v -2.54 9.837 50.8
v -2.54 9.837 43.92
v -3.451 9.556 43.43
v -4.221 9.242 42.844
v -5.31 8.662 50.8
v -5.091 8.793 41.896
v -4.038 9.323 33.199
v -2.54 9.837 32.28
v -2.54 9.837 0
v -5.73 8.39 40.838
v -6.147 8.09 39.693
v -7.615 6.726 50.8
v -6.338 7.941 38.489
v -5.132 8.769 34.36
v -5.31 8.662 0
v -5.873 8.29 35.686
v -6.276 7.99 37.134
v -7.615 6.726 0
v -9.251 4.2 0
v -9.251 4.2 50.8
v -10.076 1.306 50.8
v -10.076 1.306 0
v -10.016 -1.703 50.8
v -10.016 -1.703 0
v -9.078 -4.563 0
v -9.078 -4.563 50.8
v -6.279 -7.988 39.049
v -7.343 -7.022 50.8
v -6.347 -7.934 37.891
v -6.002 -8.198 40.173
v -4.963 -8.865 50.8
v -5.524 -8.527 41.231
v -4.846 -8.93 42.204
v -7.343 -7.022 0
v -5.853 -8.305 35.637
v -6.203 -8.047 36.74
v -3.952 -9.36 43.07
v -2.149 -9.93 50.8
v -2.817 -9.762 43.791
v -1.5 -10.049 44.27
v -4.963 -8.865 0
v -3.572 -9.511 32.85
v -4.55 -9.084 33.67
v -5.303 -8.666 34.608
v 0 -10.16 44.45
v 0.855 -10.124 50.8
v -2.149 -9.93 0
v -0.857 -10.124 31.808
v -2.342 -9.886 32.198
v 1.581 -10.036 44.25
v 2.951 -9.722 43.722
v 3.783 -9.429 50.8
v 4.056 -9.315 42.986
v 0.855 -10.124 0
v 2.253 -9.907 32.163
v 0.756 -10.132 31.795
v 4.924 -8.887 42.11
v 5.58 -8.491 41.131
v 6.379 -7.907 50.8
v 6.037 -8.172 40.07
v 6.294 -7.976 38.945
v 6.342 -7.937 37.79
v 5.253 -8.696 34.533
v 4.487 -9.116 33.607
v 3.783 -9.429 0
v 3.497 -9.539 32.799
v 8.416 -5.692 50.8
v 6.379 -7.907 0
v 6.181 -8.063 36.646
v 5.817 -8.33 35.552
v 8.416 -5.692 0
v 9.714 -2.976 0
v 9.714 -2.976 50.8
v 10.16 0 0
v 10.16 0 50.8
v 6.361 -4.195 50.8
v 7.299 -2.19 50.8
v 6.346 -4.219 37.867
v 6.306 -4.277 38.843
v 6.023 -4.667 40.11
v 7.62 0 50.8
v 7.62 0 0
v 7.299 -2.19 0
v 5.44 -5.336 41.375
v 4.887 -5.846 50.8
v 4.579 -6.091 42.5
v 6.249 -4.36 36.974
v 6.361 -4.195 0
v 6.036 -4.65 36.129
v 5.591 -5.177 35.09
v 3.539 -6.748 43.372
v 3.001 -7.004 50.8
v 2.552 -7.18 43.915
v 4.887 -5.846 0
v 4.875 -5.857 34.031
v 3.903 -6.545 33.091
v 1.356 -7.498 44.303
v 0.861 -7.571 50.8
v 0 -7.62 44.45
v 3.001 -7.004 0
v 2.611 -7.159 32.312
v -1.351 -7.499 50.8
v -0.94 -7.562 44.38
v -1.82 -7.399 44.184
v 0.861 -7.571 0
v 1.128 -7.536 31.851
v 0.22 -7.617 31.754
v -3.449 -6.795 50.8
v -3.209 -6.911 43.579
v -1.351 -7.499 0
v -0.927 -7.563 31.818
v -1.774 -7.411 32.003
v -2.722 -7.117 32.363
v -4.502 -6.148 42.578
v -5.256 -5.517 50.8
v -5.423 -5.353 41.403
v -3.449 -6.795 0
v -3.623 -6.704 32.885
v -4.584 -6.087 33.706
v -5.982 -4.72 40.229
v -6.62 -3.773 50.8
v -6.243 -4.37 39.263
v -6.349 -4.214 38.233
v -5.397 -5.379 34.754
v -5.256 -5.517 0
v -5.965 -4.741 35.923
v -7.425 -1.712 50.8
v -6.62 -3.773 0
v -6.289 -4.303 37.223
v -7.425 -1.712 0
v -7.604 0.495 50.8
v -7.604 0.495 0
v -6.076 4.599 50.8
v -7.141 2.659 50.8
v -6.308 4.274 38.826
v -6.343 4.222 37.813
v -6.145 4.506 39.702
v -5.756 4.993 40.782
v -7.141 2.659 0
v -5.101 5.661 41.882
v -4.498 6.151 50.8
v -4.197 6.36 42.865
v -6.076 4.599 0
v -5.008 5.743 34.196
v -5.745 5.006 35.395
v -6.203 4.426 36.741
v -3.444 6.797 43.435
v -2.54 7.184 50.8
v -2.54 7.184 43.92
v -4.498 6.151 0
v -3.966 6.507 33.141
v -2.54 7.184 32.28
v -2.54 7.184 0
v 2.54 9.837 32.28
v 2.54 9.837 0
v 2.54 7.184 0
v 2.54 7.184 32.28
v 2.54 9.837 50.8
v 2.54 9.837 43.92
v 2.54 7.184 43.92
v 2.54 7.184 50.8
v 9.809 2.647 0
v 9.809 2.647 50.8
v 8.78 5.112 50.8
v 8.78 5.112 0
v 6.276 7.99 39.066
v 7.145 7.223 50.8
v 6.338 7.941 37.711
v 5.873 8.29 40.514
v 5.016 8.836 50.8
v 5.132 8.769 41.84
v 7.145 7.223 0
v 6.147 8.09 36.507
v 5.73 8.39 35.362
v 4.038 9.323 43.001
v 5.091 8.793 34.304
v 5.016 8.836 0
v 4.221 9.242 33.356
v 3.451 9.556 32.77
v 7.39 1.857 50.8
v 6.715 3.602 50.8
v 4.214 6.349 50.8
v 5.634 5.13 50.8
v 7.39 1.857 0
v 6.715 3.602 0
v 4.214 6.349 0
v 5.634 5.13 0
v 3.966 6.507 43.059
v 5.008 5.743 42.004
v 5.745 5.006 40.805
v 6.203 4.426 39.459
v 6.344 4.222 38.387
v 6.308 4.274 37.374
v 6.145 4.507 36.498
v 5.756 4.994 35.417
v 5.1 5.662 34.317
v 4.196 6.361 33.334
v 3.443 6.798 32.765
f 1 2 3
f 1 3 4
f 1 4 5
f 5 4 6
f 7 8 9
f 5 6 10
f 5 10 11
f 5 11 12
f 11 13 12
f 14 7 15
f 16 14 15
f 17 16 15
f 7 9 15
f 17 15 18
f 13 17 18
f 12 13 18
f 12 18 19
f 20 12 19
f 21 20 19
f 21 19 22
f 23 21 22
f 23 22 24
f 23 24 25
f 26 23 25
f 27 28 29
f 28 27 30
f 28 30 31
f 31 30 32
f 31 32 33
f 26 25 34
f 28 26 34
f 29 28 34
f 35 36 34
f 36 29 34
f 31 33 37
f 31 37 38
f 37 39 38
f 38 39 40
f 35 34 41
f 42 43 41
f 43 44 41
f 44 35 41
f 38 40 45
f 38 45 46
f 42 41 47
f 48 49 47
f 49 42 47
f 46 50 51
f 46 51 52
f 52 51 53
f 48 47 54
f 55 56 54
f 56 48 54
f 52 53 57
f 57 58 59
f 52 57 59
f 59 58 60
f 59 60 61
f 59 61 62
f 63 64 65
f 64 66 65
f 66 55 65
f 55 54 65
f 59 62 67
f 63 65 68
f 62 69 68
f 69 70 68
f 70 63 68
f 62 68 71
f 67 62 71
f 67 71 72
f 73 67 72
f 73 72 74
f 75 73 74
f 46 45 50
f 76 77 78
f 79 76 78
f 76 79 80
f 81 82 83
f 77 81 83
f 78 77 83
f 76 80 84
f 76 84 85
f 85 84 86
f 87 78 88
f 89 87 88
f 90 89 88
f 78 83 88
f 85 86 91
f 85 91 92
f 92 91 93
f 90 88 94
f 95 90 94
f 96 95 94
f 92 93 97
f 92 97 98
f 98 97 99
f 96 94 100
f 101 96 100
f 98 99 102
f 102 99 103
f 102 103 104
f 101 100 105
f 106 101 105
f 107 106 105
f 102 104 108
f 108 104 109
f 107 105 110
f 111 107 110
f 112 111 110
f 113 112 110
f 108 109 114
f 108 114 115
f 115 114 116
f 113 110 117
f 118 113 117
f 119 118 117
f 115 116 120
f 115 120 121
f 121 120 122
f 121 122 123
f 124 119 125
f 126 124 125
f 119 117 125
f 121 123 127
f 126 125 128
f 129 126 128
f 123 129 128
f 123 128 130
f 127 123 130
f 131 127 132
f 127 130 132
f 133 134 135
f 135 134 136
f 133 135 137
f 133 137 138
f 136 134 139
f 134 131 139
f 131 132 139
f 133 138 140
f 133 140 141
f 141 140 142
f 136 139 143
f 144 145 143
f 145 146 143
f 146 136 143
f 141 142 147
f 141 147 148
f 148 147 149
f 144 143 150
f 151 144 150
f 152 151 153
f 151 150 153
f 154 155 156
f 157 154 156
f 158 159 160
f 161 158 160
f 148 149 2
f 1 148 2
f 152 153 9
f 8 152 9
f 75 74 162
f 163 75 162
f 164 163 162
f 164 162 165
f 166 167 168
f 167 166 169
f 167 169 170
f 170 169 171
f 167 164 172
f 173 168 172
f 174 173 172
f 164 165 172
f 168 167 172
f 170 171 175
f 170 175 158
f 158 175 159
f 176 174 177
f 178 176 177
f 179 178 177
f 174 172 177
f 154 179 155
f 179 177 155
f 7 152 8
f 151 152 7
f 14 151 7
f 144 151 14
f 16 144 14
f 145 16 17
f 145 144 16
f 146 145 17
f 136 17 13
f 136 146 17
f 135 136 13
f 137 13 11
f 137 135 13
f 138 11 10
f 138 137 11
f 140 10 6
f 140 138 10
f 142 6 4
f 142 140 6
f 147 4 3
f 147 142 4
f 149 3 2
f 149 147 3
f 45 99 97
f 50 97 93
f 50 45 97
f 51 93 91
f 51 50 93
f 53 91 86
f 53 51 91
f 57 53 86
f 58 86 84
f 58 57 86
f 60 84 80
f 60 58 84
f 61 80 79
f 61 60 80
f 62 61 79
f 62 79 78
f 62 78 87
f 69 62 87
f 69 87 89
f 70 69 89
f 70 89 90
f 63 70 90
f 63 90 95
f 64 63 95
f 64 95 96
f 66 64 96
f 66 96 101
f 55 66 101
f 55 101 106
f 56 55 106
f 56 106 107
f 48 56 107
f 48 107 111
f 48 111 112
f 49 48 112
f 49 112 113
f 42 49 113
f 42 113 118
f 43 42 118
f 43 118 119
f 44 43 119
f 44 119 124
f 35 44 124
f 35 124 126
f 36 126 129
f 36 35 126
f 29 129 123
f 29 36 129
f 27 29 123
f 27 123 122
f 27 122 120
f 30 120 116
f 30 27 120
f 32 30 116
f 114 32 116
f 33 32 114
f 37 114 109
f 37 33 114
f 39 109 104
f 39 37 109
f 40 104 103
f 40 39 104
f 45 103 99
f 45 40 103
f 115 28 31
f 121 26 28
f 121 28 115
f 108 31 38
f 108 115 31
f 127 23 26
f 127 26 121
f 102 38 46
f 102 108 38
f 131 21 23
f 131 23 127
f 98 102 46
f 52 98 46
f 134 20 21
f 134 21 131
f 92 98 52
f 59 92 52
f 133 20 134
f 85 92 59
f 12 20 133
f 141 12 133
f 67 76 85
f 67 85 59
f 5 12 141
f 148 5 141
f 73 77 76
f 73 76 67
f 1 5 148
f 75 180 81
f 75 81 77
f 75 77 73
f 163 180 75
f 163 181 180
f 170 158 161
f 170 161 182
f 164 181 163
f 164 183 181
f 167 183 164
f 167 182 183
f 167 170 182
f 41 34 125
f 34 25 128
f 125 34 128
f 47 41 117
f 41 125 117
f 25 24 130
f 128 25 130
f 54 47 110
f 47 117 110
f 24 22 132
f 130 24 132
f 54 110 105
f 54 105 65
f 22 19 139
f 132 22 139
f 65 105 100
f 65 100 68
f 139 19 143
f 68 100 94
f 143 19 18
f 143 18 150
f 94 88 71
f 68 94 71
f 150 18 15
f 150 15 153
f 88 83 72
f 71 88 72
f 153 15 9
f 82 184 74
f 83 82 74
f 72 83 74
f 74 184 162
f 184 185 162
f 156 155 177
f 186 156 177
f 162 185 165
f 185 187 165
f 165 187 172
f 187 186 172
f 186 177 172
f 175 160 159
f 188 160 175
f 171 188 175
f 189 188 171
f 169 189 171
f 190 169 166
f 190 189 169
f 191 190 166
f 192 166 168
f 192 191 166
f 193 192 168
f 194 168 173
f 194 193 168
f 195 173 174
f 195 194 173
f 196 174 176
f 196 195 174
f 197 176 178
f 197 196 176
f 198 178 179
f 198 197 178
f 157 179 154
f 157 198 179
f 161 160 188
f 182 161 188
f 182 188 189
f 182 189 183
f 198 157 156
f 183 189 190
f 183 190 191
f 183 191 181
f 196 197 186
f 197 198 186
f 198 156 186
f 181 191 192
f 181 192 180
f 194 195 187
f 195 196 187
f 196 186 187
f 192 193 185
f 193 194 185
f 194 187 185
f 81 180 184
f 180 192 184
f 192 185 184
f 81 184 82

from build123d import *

# Parameters (mm, degrees)
BOSS_EXTRUDE2_DEPTH = 50.8
CUT_EXTRUDE2_START  = -10.16
SKETCH2_R           = 6.35
CUT_EXTRUDE2_DEPTH  = 19.997379


with BuildPart() as part:
    # Sketch1 → Boss-Extrude2 (new body)
    with BuildSketch(Plane.XY):
        with BuildLine():
            Line((-2.54, 7.184204897), (-2.54, 9.837377699))
            ThreePointArc((-2.54, 9.837377699), (-6.221703947, -8.032185257), (10.16, 0))
            ThreePointArc((10.16, 0), (8.032185257, 6.221703947), (2.54, 9.837377699))
            Line((2.54, 9.837377699), (2.54, 7.184204897))
            ThreePointArc((2.54, 7.184204897), (6.221703947, 4.399409051), (7.62, 0))
            ThreePointArc((7.62, 0), (-4.399409051, -6.221703947), (-2.54, 7.184204897))
        make_face()
    extrude(amount=BOSS_EXTRUDE2_DEPTH)

    # Sketch2 → Cut-Extrude2 (cut)
    with BuildSketch(Plane(origin=(0, 0, 0), x_dir=(1, 0, 0), z_dir=(0, 1, 0)).offset(CUT_EXTRUDE2_START)):
        with Locations(Location((0, -38.1, 0), (0, 0, 270))):  # turned: the seam where the file's is
            Circle(SKETCH2_R)
    extrude(amount=CUT_EXTRUDE2_DEPTH, mode=Mode.SUBTRACT)


solid = part.part
